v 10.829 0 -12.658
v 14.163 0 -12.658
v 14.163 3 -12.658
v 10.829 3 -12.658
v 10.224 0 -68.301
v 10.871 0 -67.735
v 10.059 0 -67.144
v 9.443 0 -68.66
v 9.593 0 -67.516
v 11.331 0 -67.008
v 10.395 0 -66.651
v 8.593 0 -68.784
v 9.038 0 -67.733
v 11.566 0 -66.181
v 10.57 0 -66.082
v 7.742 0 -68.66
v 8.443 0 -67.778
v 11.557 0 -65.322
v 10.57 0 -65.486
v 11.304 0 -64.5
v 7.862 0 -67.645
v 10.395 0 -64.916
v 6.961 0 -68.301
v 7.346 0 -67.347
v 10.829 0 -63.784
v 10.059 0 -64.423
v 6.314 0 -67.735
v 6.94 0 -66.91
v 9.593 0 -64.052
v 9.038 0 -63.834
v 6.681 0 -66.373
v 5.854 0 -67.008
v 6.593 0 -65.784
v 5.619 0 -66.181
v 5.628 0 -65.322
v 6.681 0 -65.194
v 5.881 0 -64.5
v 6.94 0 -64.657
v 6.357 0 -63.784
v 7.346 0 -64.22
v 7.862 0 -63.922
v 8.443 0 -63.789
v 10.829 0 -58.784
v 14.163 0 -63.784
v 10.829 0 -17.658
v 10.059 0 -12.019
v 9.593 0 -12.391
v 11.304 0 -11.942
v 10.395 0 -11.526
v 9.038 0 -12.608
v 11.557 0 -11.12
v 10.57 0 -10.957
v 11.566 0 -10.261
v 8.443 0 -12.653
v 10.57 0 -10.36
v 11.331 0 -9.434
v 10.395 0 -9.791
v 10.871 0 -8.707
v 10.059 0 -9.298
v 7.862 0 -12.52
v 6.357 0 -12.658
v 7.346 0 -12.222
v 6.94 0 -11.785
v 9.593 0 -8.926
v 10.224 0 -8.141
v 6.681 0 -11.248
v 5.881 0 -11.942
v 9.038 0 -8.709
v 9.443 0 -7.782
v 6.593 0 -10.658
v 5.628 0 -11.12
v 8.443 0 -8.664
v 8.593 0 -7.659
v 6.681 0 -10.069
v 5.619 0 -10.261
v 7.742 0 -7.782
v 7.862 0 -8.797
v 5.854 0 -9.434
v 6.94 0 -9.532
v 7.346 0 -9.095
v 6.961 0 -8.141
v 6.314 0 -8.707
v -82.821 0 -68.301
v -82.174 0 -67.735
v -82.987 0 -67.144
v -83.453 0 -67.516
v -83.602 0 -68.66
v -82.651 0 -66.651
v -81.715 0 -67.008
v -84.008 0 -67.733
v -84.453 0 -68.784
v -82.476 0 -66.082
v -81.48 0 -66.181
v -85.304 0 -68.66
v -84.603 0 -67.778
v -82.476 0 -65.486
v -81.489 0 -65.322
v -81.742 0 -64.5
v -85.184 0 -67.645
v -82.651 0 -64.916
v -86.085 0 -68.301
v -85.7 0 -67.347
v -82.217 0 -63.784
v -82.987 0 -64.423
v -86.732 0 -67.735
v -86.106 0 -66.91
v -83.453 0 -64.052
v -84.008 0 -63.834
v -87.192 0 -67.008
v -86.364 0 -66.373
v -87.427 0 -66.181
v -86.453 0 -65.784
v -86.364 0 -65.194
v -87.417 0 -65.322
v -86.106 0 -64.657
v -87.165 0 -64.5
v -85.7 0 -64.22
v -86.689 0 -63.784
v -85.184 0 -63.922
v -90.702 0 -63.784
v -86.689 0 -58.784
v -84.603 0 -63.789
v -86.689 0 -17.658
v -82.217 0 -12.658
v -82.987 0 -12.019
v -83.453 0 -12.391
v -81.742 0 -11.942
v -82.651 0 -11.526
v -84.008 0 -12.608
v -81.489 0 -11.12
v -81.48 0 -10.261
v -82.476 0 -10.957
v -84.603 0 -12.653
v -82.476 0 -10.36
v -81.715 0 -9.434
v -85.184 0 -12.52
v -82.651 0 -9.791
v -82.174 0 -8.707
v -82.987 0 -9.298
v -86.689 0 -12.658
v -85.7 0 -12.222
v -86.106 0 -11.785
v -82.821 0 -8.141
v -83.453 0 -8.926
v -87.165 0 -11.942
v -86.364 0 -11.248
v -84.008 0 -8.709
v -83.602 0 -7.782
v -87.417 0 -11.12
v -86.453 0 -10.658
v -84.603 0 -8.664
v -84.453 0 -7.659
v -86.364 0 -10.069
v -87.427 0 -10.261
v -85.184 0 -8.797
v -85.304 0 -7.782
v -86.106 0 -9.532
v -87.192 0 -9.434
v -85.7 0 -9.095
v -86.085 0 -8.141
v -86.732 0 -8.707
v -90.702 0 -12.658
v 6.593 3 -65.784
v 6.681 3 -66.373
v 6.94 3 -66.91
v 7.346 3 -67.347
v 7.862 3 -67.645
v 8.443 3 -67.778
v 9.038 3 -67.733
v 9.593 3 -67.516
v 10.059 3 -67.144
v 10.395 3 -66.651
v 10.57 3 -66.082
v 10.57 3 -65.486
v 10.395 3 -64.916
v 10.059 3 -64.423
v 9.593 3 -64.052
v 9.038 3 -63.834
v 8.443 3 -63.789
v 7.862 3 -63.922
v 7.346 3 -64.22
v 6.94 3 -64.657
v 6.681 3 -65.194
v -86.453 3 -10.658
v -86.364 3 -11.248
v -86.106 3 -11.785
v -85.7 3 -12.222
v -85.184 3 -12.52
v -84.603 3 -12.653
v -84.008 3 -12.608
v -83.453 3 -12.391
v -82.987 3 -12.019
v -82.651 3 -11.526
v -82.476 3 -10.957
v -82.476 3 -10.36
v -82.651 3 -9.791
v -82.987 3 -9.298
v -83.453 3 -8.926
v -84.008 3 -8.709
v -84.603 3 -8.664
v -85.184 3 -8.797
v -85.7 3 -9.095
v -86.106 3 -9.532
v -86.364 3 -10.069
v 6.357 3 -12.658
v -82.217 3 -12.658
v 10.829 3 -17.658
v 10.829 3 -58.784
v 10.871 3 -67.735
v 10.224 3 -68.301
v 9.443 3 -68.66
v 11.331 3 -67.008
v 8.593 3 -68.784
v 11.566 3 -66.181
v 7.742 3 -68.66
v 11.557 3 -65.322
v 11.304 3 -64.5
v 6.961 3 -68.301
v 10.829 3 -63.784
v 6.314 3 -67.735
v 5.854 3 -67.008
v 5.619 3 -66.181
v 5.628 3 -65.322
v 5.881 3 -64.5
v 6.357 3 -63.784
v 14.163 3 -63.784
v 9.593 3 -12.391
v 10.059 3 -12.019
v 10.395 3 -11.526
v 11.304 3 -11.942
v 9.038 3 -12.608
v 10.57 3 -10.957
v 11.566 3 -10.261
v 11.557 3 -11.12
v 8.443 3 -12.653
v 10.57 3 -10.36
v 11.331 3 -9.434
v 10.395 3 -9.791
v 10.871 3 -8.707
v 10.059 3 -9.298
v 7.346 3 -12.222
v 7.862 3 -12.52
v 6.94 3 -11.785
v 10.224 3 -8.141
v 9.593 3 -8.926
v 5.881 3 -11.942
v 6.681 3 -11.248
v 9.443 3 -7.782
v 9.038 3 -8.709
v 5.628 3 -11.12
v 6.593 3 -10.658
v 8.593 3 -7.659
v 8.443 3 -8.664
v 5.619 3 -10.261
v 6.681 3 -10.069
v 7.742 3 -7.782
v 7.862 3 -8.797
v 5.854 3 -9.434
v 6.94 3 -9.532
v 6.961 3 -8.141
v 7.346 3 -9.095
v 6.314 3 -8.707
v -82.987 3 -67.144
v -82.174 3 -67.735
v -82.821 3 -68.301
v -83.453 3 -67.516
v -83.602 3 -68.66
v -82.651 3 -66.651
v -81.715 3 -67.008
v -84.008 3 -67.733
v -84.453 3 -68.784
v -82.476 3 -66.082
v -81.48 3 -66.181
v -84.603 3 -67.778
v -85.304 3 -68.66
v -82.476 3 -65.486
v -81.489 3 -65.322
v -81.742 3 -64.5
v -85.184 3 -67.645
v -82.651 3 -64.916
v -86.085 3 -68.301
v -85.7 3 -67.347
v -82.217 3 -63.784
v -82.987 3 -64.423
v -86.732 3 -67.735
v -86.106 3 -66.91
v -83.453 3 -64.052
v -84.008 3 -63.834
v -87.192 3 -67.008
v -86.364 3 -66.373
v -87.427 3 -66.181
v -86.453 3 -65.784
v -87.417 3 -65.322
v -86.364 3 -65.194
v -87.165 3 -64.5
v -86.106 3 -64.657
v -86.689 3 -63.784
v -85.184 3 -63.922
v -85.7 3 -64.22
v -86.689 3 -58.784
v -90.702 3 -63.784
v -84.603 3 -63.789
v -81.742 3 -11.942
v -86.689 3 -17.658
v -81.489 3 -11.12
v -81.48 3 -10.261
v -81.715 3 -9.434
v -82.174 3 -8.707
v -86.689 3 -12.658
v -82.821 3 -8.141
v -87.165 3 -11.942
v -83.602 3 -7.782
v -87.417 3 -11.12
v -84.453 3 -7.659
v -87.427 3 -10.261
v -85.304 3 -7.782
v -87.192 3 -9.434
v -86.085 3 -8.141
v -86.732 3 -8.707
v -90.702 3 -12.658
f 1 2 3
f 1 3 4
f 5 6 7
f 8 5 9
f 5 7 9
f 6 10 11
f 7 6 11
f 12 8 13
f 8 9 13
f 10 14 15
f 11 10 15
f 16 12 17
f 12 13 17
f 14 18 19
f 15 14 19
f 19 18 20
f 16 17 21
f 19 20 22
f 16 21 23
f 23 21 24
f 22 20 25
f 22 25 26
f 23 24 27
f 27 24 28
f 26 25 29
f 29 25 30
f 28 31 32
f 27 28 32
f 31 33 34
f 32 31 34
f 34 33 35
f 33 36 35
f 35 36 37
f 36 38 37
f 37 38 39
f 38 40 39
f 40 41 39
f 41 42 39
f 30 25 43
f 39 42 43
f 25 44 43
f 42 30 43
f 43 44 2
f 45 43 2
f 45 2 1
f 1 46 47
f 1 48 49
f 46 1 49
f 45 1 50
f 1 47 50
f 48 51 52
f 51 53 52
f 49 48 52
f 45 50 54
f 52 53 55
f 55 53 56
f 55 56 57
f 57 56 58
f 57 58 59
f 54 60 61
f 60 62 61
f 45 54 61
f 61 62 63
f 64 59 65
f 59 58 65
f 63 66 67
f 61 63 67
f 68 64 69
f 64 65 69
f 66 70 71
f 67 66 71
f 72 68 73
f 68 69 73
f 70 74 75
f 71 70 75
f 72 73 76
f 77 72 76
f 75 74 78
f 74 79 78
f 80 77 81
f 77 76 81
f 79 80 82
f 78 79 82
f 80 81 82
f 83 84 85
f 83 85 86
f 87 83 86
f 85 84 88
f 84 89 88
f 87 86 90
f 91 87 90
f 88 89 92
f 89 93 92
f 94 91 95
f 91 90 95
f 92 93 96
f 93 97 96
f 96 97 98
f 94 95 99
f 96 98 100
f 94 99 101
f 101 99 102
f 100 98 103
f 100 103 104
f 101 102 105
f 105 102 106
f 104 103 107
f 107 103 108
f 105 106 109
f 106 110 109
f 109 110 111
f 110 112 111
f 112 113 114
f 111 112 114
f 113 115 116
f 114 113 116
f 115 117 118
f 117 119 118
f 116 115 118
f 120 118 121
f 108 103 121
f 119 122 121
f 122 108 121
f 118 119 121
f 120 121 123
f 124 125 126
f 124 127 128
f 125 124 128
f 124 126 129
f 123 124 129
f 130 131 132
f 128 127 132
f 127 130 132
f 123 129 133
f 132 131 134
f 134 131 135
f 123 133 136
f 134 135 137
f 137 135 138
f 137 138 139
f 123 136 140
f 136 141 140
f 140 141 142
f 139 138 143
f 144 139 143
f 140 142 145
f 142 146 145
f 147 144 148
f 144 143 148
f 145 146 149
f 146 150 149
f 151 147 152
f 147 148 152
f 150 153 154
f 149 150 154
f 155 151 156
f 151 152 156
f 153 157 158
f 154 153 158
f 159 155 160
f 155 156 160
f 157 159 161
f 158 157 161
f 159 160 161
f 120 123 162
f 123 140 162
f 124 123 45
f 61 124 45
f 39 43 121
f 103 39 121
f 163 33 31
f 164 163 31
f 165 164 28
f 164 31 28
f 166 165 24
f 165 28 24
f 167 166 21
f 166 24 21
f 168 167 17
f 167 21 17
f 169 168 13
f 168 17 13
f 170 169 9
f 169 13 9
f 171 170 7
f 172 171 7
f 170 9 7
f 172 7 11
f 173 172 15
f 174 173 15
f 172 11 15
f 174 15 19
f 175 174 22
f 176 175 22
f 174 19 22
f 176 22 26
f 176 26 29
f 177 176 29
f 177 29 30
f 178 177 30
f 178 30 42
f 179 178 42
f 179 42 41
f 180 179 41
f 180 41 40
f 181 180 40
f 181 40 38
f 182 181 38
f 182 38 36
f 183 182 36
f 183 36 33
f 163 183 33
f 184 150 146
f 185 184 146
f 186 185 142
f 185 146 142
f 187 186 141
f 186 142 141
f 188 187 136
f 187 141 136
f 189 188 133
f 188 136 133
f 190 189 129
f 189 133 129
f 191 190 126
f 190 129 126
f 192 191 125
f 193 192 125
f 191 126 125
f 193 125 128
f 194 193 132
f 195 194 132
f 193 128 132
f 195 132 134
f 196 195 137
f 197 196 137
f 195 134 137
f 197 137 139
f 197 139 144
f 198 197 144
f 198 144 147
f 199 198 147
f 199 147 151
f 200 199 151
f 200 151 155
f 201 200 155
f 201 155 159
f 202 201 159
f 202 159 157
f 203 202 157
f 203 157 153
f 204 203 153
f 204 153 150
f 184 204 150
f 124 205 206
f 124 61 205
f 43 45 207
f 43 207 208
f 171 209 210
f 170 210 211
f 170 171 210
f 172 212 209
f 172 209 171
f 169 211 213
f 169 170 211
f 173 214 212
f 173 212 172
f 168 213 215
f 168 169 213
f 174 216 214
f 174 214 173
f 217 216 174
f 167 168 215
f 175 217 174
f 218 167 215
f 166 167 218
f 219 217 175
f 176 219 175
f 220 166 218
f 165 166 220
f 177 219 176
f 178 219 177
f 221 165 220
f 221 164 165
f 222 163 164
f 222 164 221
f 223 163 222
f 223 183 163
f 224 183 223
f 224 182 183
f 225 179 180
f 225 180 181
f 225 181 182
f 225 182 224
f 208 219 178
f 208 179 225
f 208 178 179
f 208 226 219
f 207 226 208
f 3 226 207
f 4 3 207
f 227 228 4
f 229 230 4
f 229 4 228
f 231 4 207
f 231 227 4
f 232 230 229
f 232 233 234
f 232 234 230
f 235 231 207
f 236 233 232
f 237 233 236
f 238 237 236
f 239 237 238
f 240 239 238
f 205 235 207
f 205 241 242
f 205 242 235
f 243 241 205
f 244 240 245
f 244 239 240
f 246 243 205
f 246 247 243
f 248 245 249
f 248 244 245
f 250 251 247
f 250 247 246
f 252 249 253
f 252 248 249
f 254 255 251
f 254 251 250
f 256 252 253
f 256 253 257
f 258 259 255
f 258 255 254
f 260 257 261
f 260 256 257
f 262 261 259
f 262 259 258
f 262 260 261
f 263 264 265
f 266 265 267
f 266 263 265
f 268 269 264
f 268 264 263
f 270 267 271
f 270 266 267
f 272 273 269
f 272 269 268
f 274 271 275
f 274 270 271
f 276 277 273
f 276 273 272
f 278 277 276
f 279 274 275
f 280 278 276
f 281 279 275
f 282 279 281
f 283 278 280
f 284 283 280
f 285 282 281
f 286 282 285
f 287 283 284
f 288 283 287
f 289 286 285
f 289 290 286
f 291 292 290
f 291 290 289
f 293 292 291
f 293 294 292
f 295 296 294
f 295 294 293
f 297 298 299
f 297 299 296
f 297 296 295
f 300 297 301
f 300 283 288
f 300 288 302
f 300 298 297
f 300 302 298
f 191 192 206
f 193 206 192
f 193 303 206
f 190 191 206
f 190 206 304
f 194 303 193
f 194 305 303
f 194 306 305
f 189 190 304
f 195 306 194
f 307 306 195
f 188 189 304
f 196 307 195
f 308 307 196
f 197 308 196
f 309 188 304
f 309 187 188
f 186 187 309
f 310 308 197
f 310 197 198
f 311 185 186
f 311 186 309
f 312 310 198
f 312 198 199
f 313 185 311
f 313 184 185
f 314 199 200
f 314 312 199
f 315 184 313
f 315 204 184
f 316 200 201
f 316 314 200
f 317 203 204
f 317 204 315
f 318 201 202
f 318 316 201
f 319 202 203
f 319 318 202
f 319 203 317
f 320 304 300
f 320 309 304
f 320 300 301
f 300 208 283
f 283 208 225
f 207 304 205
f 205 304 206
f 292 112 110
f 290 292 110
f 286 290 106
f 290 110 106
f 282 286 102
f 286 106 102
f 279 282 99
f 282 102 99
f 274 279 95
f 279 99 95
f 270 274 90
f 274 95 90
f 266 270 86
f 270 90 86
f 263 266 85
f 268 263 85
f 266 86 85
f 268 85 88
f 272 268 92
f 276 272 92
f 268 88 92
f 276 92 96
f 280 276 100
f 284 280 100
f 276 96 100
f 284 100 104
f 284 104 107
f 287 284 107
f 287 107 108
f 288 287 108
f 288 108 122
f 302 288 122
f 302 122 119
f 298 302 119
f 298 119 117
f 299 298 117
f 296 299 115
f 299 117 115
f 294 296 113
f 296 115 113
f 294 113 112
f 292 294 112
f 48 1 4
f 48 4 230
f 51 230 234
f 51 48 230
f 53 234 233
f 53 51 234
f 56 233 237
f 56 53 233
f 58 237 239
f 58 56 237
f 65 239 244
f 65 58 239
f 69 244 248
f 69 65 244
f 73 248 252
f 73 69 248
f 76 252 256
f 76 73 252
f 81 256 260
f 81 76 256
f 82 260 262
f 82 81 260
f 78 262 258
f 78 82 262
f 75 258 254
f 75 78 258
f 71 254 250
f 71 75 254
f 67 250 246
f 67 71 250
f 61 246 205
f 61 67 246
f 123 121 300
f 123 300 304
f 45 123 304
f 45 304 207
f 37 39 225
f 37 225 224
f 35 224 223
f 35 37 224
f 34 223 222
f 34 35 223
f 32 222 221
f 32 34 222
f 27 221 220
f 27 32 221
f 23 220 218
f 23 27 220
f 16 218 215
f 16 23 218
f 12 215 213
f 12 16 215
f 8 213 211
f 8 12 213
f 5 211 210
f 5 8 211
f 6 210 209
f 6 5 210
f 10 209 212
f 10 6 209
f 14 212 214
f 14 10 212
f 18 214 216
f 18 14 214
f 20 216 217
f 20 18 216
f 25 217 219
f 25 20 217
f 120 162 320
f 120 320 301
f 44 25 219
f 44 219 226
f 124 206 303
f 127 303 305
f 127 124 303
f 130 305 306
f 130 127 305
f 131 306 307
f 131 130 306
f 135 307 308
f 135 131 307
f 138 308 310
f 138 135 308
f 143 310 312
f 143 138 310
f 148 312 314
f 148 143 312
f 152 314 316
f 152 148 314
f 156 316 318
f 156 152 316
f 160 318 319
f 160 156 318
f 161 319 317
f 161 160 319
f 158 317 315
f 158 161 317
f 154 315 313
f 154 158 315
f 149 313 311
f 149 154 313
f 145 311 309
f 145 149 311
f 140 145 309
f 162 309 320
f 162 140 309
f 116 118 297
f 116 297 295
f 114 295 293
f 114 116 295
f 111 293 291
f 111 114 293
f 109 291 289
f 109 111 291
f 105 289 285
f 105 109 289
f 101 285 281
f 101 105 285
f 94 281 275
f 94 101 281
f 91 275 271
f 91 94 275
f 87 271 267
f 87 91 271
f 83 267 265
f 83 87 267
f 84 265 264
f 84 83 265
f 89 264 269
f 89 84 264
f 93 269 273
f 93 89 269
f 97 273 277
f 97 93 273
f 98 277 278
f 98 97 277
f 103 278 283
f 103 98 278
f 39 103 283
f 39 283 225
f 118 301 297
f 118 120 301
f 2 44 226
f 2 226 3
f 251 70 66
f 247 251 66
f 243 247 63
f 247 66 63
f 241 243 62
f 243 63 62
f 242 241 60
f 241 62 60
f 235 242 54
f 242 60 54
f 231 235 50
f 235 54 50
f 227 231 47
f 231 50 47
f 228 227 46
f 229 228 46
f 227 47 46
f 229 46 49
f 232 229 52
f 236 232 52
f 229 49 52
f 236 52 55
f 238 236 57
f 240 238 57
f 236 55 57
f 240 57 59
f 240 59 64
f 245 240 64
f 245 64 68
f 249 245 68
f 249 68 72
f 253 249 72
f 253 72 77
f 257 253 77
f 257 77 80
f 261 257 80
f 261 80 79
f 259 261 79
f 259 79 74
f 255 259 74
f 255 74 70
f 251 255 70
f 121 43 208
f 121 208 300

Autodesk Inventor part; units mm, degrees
ref_plane "YZ Plane" through (0, 0, 0) normal (1, 0, 0) x (0, 1, 0)
ref_plane "XZ Plane" through (0, 0, 0) normal (0, 1, 0) x (-1, 0, 0)
ref_plane "XY Plane" through (0, 0, 0) normal (0, 0, 1) x (1, 0, 0)
sketch "Sketch1" plane through (0, 0, 0) normal (0, 1, 0) x (-1, 0, 0)
  spline S0 degree 3 poles (-9.8463, -11.5333) (-9.7942, -11.6131) (-9.7348, -11.6874) (-9.6692, -11.7553) (-9.4724, -11.9589) (-9.2192, -12.1042) (-8.936, -12.1641) (-8.8416, -12.1841) (-8.7439, -12.1946) (-8.6437, -12.1946) (-8.5436, -12.1946) (-8.4459, -12.1841) (-8.3515, -12.1641) (-8.0682, -12.1042) (-7.8151, -11.9589) (-7.6183, -11.7553) (-7.5527, -11.6874) (-7.4933, -11.6131) (-7.4412, -11.5333) (-7.337, -11.3737) (-7.2616, -11.1922) (-7.223, -10.9969) (-7.2037, -10.8993) (-7.1935, -10.7982) (-7.1935, -10.6946) (-7.1935, -9.8662) (-7.8428, -9.1946) (-8.6437, -9.1946) (-9.4447, -9.1946) (-10.094, -9.8662) (-10.094, -10.6946) (-10.094, -10.7982) (-10.0838, -10.8993) (-10.0645, -10.9969) (-10.0259, -11.1922) (-9.9505, -11.3737) (-9.8463, -11.5333) knots 0 0 0 0 1 1 1 2 2 2 3 3 3 4 4 4 5 5 5 6 6 6 7 7 7 8 8 8 9 9 9 10 10 10 11 11 11 12 12 12 12
  line L0 (-9.8463, -11.5333) -> (-9.7942, -11.6131) construction
  line L1 (-9.7942, -11.6131) -> (-9.7348, -11.6874) construction
  line L2 (-9.7348, -11.6874) -> (-9.6692, -11.7553) construction
  line L3 (-9.6692, -11.7553) -> (-9.4724, -11.9589) construction
  line L4 (-9.4724, -11.9589) -> (-9.2192, -12.1042) construction
  line L5 (-9.2192, -12.1042) -> (-8.936, -12.1641) construction
  line L6 (-8.936, -12.1641) -> (-8.8416, -12.1841) construction
  line L7 (-8.8416, -12.1841) -> (-8.7439, -12.1946) construction
  line L8 (-8.7439, -12.1946) -> (-8.6437, -12.1946) construction
  line L9 (-8.6437, -12.1946) -> (-8.5436, -12.1946) construction
  line L10 (-8.5436, -12.1946) -> (-8.4459, -12.1841) construction
  line L11 (-8.4459, -12.1841) -> (-8.3515, -12.1641) construction
  line L12 (-8.3515, -12.1641) -> (-8.0682, -12.1042) construction
  line L13 (-8.0682, -12.1042) -> (-7.8151, -11.9589) construction
  line L14 (-7.8151, -11.9589) -> (-7.6183, -11.7553) construction
  line L15 (-7.6183, -11.7553) -> (-7.5527, -11.6874) construction
  line L16 (-7.5527, -11.6874) -> (-7.4933, -11.6131) construction
  line L17 (-7.4933, -11.6131) -> (-7.4412, -11.5333) construction
  line L18 (-7.4412, -11.5333) -> (-7.337, -11.3737) construction
  line L19 (-7.337, -11.3737) -> (-7.2616, -11.1922) construction
  line L20 (-7.2616, -11.1922) -> (-7.223, -10.9969) construction
  line L21 (-7.223, -10.9969) -> (-7.2037, -10.8993) construction
  line L22 (-7.2037, -10.8993) -> (-7.1935, -10.7982) construction
  line L23 (-7.1935, -10.7982) -> (-7.1935, -10.6946) construction
  line L24 (-7.1935, -10.6946) -> (-7.1935, -9.8662) construction
  line L25 (-7.1935, -9.8662) -> (-7.8428, -9.1946) construction
  line L26 (-7.8428, -9.1946) -> (-8.6437, -9.1946) construction
  line L27 (-8.6437, -9.1946) -> (-9.4447, -9.1946) construction
  line L28 (-9.4447, -9.1946) -> (-10.094, -9.8662) construction
  line L29 (-10.094, -9.8662) -> (-10.094, -10.6946) construction
  line L30 (-10.094, -10.6946) -> (-10.094, -10.7982) construction
  line L31 (-10.094, -10.7982) -> (-10.0838, -10.8993) construction
  line L32 (-10.0838, -10.8993) -> (-10.0645, -10.9969) construction
  line L33 (-10.0645, -10.9969) -> (-10.0259, -11.1922) construction
  line L34 (-10.0259, -11.1922) -> (-9.9505, -11.3737) construction
  line L35 (-9.9505, -11.3737) -> (-9.8463, -11.5333) construction
  spline S1 degree 3 poles (83.1689, -11.5333) (83.221, -11.6131) (83.2803, -11.6874) (83.3459, -11.7553) (83.5428, -11.9589) (83.7959, -12.1042) (84.0791, -12.1641) (84.1735, -12.1841) (84.2713, -12.1946) (84.3714, -12.1946) (84.4715, -12.1946) (84.5693, -12.1841) (84.6637, -12.1641) (84.9469, -12.1042) (85.2001, -11.9589) (85.3969, -11.7553) (85.4625, -11.6874) (85.5218, -11.6131) (85.574, -11.5333) (85.6782, -11.3737) (85.7536, -11.1922) (85.7922, -10.9969) (85.8115, -10.8993) (85.8217, -10.7982) (85.8217, -10.6946) (85.8217, -9.8662) (85.1724, -9.1946) (84.3714, -9.1946) (83.5705, -9.1946) (82.9212, -9.8662) (82.9212, -10.6946) (82.9212, -10.7982) (82.9313, -10.8993) (82.9506, -10.9969) (82.9893, -11.1922) (83.0646, -11.3737) (83.1689, -11.5333) knots 0 0 0 0 1 1 1 2 2 2 3 3 3 4 4 4 5 5 5 6 6 6 7 7 7 8 8 8 9 9 9 10 10 10 11 11 11 12 12 12 12
  line L36 (83.1689, -11.5333) -> (83.221, -11.6131) construction
  line L37 (83.221, -11.6131) -> (83.2803, -11.6874) construction
  line L38 (83.2803, -11.6874) -> (83.3459, -11.7553) construction
  line L39 (83.3459, -11.7553) -> (83.5428, -11.9589) construction
  line L40 (83.5428, -11.9589) -> (83.7959, -12.1042) construction
  line L41 (83.7959, -12.1042) -> (84.0791, -12.1641) construction
  line L42 (84.0791, -12.1641) -> (84.1735, -12.1841) construction
  line L43 (84.1735, -12.1841) -> (84.2713, -12.1946) construction
  line L44 (84.2713, -12.1946) -> (84.3714, -12.1946) construction
  line L45 (84.3714, -12.1946) -> (84.4715, -12.1946) construction
  line L46 (84.4715, -12.1946) -> (84.5693, -12.1841) construction
  line L47 (84.5693, -12.1841) -> (84.6637, -12.1641) construction
  line L48 (84.6637, -12.1641) -> (84.9469, -12.1042) construction
  line L49 (84.9469, -12.1042) -> (85.2001, -11.9589) construction
  line L50 (85.2001, -11.9589) -> (85.3969, -11.7553) construction
  line L51 (85.3969, -11.7553) -> (85.4625, -11.6874) construction
  line L52 (85.4625, -11.6874) -> (85.5218, -11.6131) construction
  line L53 (85.5218, -11.6131) -> (85.574, -11.5333) construction
  line L54 (85.574, -11.5333) -> (85.6782, -11.3737) construction
  line L55 (85.6782, -11.3737) -> (85.7536, -11.1922) construction
  line L56 (85.7536, -11.1922) -> (85.7922, -10.9969) construction
  line L57 (85.7922, -10.9969) -> (85.8115, -10.8993) construction
  line L58 (85.8115, -10.8993) -> (85.8217, -10.7982) construction
  line L59 (85.8217, -10.7982) -> (85.8217, -10.6946) construction
  line L60 (85.8217, -10.6946) -> (85.8217, -9.8662) construction
  line L61 (85.8217, -9.8662) -> (85.1724, -9.1946) construction
  line L62 (85.1724, -9.1946) -> (84.3714, -9.1946) construction
  line L63 (84.3714, -9.1946) -> (83.5705, -9.1946) construction
  line L64 (83.5705, -9.1946) -> (82.9212, -9.8662) construction
  line L65 (82.9212, -9.8662) -> (82.9212, -10.6946) construction
  line L66 (82.9212, -10.6946) -> (82.9212, -10.7982) construction
  line L67 (82.9212, -10.7982) -> (82.9313, -10.8993) construction
  line L68 (82.9313, -10.8993) -> (82.9506, -10.9969) construction
  line L69 (82.9506, -10.9969) -> (82.9893, -11.1922) construction
  line L70 (82.9893, -11.1922) -> (83.0646, -11.3737) construction
  line L71 (83.0646, -11.3737) -> (83.1689, -11.5333) construction
  line L72 (-14.2577, -12.5451) -> (-14.2577, -64.0273)
  line L73 (-14.2577, -64.0273) -> (90.783, -64.0273)
  line L74 (90.783, -64.0273) -> (90.783, -12.5451)
  line L75 (90.783, -12.5451) -> (-14.2577, -12.5451)
  spline S2 degree 3 poles (-8.6437, -64.2555) (-9.4447, -64.2555) (-10.094, -64.9271) (-10.094, -65.7555) (-10.094, -66.5839) (-9.4447, -67.2555) (-8.6437, -67.2555) (-7.8428, -67.2555) (-7.1935, -66.5839) (-7.1935, -65.7555) (-7.1935, -64.9271) (-7.8428, -64.2555) (-8.6437, -64.2555) knots 0 0 0 0 1 1 1 2 2 2 3 3 3 4 4 4 4
  line L76 (-8.6437, -64.2555) -> (-9.4447, -64.2555) construction
  line L77 (-9.4447, -64.2555) -> (-10.094, -64.9271) construction
  line L78 (-10.094, -64.9271) -> (-10.094, -65.7555) construction
  line L79 (-10.094, -65.7555) -> (-10.094, -66.5839) construction
  line L80 (-10.094, -66.5839) -> (-9.4447, -67.2555) construction
  line L81 (-9.4447, -67.2555) -> (-8.6437, -67.2555) construction
  line L82 (-8.6437, -67.2555) -> (-7.8428, -67.2555) construction
  line L83 (-7.8428, -67.2555) -> (-7.1935, -66.5839) construction
  line L84 (-7.1935, -66.5839) -> (-7.1935, -65.7555) construction
  line L85 (-7.1935, -65.7555) -> (-7.1935, -64.9271) construction
  line L86 (-7.1935, -64.9271) -> (-7.8428, -64.2555) construction
  line L87 (-7.8428, -64.2555) -> (-8.6437, -64.2555) construction
  spline S3 degree 3 poles (84.4193, -64.2555) (83.6184, -64.2555) (82.9691, -64.9271) (82.9691, -65.7555) (82.9691, -66.5839) (83.6184, -67.2555) (84.4193, -67.2555) (85.2203, -67.2555) (85.8695, -66.5839) (85.8695, -65.7555) (85.8695, -64.9271) (85.2203, -64.2555) (84.4193, -64.2555) knots 0 0 0 0 1 1 1 2 2 2 3 3 3 4 4 4 4
  line L88 (84.4193, -64.2555) -> (83.6184, -64.2555) construction
  line L89 (83.6184, -64.2555) -> (82.9691, -64.9271) construction
  line L90 (82.9691, -64.9271) -> (82.9691, -65.7555) construction
  line L91 (82.9691, -65.7555) -> (82.9691, -66.5839) construction
  line L92 (82.9691, -66.5839) -> (83.6184, -67.2555) construction
  line L93 (83.6184, -67.2555) -> (84.4193, -67.2555) construction
  line L94 (84.4193, -67.2555) -> (85.2203, -67.2555) construction
  line L95 (85.2203, -67.2555) -> (85.8695, -66.5839) construction
  line L96 (85.8695, -66.5839) -> (85.8695, -65.7555) construction
  line L97 (85.8695, -65.7555) -> (85.8695, -64.9271) construction
  line L98 (85.8695, -64.9271) -> (85.2203, -64.2555) construction
  line L99 (85.2203, -64.2555) -> (84.4193, -64.2555) construction
  point P0 (0, 0)
sketch "Sketch2" plane through (0, 0, 0) normal (0, 1, 0) x (-1, 0, 0)
  circle A0 centre (84.4532, -10.6585) radius 2
  circle A1 centre (-8.5926, -10.6585) radius 2
  circle A2 centre (-8.5926, -65.7836) radius 2
  circle A3 centre (84.4532, -65.7836) radius 2
  circle A4 centre (-8.5926, -10.6585) radius 3
  circle A5 centre (-8.5926, -65.7836) radius 3
  circle A6 centre (84.4532, -65.7836) radius 3
  circle A7 centre (84.4532, -10.6585) radius 3
  line L0 (-14.1634, -12.6585) -> (90.7016, -12.6585)
  line L1 (90.7016, -12.6585) -> (90.7016, -17.6585)
  line L2 (90.7016, -17.6585) -> (-14.1634, -17.6585)
  line L3 (-14.1634, -17.6585) -> (-14.1634, -12.6585)
  line L4 (90.7016, -63.7836) -> (-14.1634, -63.7836)
  line L5 (-14.1634, -63.7836) -> (-14.1634, -58.7836)
  line L6 (-14.1634, -58.7836) -> (90.7016, -58.7836)
  line L7 (90.7016, -58.7836) -> (90.7016, -63.7836)
  line L8 (-14.1634, -12.6585) -> (-10.8287, -12.6585)
  line L9 (-10.8287, -12.6585) -> (-10.8287, -63.7836)
  line L10 (-10.8287, -63.7836) -> (-14.1634, -63.7836)
  line L11 (-14.1634, -63.7836) -> (-14.1634, -12.6585)
  line L12 (86.6893, -12.6585) -> (90.7016, -12.6585)
  line L13 (90.7016, -12.6585) -> (90.7016, -63.7836)
  line L14 (90.7016, -63.7836) -> (86.6893, -63.7836)
  line L15 (86.6893, -63.7836) -> (86.6893, -12.6585)
  point P0 (0, 0)
  dimension "d5" = 6
  dimension "d7" = 6
  dimension "d0" = 4
  dimension "d1" = 4
  dimension "d2" = 4
  dimension "d3" = 4
  dimension "d4" = 6
  dimension "d6" = 6
  dimension "d8" = 5
  dimension "d9" = 5
extrude "Extrusion1" add sketch "Sketch2" along normal blind 3 contours L0 A7 | L0 A7 | A7 L15 L2 L9 A4 L0 | L0 L1 L2 L15 | L0 A4 | A4 L0 | L2 L13 L6 L15 | L9 L2 L3 L0 | L9 L6 L11 L2 | L15 A6 L4 A5 L9 L6 | L6 L7 L4 L15 | L9 L4 L5 L6 | L4 A6 | A6 L4 | L4 A5 | A5 L4
properties part number "lcd-spacer-model"
